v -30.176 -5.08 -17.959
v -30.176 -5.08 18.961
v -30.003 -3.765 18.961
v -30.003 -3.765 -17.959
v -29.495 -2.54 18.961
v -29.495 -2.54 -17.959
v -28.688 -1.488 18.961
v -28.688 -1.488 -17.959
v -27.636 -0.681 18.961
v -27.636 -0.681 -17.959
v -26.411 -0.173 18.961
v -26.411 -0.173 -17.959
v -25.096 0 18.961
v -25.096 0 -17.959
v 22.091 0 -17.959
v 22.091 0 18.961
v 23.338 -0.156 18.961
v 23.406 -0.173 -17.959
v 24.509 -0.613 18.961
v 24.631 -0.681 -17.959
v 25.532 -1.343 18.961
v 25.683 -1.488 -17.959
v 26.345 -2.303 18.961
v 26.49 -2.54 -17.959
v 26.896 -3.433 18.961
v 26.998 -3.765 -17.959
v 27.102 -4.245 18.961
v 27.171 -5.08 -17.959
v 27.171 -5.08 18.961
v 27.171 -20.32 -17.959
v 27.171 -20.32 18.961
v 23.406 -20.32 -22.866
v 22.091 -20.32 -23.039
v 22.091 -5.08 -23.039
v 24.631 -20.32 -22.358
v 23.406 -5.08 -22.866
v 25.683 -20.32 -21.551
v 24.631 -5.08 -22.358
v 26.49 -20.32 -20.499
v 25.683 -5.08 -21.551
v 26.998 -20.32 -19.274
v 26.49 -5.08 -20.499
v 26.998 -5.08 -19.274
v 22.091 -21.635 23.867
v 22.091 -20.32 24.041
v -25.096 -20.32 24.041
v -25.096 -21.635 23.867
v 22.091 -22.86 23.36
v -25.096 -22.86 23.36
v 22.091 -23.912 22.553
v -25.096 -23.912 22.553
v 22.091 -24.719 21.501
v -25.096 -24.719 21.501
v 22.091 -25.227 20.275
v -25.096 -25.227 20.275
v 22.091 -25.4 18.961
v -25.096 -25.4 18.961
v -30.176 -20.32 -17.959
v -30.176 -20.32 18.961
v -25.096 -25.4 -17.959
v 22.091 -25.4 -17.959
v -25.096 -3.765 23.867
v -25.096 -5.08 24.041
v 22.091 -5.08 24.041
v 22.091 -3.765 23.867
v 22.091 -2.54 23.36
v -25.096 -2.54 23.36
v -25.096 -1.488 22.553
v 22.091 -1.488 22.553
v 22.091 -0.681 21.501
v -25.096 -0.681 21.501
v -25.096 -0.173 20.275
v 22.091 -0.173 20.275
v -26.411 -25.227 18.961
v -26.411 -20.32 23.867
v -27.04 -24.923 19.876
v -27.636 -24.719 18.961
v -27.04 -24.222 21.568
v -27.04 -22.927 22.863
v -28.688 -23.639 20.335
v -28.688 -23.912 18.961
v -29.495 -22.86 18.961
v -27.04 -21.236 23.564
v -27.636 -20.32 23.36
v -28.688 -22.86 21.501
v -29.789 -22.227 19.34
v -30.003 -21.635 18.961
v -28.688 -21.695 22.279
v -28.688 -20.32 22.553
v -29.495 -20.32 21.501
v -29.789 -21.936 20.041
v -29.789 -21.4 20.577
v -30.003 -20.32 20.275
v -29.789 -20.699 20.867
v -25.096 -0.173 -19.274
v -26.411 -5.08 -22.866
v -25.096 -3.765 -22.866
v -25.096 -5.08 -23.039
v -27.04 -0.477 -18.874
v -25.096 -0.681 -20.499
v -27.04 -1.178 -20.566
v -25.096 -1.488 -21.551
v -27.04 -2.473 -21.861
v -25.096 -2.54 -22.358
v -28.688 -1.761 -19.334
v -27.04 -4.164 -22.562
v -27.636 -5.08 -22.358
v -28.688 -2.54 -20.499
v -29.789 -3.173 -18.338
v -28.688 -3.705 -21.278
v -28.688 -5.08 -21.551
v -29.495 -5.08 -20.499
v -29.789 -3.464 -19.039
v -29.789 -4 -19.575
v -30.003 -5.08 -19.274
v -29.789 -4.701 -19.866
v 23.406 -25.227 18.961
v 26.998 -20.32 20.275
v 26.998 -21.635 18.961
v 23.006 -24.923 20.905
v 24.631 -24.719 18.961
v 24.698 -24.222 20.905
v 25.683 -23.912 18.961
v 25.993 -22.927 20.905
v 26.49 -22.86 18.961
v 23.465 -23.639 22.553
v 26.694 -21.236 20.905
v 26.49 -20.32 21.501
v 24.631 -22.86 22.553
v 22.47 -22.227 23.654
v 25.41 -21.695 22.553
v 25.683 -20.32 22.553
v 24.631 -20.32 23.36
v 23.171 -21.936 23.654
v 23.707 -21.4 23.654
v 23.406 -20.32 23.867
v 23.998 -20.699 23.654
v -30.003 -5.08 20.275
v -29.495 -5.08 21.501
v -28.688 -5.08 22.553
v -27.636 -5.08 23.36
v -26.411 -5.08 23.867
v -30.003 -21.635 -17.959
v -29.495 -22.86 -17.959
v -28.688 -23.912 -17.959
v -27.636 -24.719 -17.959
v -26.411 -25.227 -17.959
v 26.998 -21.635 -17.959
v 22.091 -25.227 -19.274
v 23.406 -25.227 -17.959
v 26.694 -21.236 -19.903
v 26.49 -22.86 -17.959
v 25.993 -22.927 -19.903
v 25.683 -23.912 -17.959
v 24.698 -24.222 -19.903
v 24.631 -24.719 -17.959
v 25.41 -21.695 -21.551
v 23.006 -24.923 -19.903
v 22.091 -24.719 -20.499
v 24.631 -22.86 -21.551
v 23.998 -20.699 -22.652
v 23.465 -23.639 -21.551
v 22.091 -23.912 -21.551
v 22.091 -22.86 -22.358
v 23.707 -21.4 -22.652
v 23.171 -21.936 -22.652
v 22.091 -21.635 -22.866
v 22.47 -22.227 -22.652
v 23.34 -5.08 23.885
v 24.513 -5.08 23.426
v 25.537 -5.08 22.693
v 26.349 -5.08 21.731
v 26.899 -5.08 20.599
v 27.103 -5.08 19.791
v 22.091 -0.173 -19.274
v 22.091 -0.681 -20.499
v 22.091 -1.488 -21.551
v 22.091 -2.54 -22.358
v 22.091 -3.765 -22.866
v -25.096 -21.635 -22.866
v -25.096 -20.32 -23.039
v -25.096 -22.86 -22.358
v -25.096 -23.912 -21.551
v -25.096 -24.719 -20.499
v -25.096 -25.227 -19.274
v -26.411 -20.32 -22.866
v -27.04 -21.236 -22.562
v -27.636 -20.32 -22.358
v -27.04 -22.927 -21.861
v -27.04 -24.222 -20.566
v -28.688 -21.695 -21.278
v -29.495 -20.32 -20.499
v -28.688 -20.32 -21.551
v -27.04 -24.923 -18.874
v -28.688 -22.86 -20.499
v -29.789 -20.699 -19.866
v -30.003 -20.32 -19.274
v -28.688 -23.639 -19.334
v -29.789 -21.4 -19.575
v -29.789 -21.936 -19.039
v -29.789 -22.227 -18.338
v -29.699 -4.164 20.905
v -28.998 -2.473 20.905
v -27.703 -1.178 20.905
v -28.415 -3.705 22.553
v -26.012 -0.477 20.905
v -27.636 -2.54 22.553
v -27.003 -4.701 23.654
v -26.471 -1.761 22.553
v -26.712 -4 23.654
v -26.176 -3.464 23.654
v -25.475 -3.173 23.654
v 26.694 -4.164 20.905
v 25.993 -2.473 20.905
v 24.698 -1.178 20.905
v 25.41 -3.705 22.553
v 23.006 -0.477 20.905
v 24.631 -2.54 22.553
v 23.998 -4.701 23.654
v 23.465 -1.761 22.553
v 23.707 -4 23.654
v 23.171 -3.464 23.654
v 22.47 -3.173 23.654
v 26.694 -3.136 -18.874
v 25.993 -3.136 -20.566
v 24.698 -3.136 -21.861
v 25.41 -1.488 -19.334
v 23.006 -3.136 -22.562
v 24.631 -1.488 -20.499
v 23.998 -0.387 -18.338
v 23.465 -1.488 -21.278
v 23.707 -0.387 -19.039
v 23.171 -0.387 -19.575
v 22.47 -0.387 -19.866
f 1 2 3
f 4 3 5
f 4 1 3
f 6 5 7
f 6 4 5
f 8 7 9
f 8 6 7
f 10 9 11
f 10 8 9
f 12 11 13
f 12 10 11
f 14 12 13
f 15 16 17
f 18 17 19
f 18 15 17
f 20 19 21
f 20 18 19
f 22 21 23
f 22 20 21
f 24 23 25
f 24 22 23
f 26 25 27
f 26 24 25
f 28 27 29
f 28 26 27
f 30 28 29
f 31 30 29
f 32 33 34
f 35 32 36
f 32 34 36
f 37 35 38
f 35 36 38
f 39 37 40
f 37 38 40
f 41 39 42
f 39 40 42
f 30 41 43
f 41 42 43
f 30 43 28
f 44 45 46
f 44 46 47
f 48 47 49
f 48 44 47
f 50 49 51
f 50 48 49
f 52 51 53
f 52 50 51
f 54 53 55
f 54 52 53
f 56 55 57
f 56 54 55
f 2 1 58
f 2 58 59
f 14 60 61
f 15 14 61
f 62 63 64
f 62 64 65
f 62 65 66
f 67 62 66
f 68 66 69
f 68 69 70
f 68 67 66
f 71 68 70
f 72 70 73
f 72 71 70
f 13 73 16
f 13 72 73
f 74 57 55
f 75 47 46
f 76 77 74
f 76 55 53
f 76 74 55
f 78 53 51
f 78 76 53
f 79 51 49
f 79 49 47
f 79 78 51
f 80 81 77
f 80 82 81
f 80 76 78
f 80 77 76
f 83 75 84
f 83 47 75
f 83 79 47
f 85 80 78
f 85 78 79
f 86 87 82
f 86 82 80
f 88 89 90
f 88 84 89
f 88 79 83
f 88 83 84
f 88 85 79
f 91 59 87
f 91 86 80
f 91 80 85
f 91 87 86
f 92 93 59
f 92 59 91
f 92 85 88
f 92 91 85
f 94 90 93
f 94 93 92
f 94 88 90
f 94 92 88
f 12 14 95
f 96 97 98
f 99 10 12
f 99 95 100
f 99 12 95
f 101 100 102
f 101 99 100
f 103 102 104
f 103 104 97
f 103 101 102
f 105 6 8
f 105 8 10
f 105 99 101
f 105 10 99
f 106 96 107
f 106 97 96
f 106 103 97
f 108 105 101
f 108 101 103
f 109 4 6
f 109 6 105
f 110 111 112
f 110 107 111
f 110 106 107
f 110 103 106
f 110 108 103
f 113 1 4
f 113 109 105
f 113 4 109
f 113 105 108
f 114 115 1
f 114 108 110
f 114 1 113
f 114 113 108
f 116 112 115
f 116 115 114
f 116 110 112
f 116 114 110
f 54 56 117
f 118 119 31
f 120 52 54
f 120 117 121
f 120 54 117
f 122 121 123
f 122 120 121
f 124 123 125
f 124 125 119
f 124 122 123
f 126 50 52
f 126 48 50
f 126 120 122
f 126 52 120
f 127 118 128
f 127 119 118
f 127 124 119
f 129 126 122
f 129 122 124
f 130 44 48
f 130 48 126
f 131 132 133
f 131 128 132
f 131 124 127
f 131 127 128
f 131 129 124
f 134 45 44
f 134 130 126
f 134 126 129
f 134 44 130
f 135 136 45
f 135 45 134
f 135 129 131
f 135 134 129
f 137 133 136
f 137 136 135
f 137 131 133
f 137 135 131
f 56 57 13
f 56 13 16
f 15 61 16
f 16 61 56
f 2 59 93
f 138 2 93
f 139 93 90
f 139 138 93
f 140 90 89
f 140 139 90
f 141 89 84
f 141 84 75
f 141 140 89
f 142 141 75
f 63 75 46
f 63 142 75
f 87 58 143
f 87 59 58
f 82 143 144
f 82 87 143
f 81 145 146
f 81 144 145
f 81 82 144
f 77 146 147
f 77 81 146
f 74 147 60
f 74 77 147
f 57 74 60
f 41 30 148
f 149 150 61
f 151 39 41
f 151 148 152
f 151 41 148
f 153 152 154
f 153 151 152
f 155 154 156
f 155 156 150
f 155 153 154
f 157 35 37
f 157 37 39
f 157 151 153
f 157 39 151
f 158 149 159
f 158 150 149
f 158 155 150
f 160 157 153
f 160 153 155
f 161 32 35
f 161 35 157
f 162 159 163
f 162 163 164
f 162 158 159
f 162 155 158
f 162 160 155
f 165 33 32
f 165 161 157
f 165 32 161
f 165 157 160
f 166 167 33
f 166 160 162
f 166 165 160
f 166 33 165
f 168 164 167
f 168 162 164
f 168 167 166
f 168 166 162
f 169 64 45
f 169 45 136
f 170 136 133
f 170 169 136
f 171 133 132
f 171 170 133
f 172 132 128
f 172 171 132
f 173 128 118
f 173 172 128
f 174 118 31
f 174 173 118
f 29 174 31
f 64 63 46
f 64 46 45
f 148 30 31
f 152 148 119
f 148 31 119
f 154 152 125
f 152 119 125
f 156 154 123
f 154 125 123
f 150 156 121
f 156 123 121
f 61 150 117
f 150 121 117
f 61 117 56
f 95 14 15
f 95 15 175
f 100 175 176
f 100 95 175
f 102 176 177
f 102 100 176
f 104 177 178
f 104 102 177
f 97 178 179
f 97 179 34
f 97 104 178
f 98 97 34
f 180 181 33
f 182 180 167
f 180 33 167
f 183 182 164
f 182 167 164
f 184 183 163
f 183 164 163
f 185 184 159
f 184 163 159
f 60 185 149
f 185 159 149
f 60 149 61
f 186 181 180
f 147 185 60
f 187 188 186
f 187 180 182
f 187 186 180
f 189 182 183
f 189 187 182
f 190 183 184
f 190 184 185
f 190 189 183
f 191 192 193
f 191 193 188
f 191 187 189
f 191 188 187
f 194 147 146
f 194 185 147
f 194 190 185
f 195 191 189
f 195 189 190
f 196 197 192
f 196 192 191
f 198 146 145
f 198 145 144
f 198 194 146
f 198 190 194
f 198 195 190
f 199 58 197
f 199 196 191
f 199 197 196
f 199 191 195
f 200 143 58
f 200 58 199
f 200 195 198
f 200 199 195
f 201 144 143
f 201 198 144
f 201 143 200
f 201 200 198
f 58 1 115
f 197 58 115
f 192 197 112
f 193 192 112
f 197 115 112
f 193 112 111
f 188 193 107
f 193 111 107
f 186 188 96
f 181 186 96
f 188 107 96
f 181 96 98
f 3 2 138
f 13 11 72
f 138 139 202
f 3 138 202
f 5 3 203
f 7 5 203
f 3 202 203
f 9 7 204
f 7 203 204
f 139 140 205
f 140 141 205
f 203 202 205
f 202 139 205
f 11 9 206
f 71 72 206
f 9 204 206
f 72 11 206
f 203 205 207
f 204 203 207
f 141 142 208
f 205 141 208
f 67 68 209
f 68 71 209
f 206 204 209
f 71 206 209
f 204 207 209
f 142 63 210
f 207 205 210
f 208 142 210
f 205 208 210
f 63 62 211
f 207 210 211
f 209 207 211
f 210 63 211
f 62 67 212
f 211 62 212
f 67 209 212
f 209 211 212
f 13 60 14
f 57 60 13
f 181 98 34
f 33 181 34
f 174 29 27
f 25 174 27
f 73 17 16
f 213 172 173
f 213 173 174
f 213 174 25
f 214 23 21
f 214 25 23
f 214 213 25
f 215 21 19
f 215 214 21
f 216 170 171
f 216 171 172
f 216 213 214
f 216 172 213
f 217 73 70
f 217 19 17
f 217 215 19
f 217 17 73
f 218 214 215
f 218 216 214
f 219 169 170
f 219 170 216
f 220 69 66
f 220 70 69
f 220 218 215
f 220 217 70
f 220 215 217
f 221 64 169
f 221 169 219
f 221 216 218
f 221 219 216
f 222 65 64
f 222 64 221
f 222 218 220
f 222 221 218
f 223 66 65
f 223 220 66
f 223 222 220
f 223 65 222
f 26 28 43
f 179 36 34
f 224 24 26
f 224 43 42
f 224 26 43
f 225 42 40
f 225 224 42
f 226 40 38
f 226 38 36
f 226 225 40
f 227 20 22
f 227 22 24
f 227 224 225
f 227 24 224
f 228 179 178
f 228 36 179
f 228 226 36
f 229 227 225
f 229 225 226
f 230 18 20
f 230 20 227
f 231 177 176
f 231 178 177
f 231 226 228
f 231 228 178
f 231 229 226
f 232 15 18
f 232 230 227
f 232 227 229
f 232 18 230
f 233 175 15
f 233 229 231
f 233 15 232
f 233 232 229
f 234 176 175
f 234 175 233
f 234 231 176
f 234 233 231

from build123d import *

# Parameters (mm, degrees)
F0_W         = 57.346759364
F0_H         = 47.0794383436
F1_DEPTH     = 25.4
F2_R         = 5.08
F3_T1_DEPTH  = 33.02
F3_T3_DEPTH  = 72.4794383436
F3_S7_W      = 5.08
F3_S7_H      = 5.08
F3_T8_DEPTH  = 5.08
F3_S13_W     = 5.08
F3_S13_H     = 5.08
F3_T14_DEPTH = 5.08
F4_T1_DEPTH  = 47.186759364
F4_T3_DEPTH  = 15.24
F4_T5_DEPTH  = 54.6994383436
F4_S9_W      = 5.08
F4_S9_H      = 5.08
F4_T10_DEPTH = 5.08
F4_S15_W     = 5.08
F4_S15_H     = 5.08
F4_T16_DEPTH = 5.08
F4_S21_W     = 5.08
F4_S21_H     = 5.08
F4_T22_DEPTH = 5.08
F5_T1_DEPTH  = 47.186759364
F5_T3_DEPTH  = 15.24
F5_S7_W      = 5.08
F5_S7_H      = 5.08
F5_T8_DEPTH  = 5.08
F5_S13_W     = 5.08
F5_S13_H     = 5.08
F5_T14_DEPTH = 5.08
F5_T18_ANGLE = 89.9999999979
F6_DEPTH     = 25.4


# Not quite as in the source:
# - a fillet or chamfer that OpenCascade refuses, or shapes differently, is made with other operations: its cross-section is extruded or revolved along the edge and cut away or added


with BuildPart() as f1:
    # F0 (on Front) → F1 (new body)
    with BuildSketch(Plane.XZ):
        with Locations((-1.5025353059, 0.5008457229)):
            Rectangle(F0_W, F0_H)
    extrude(amount=F1_DEPTH)

    # F2
    f2_edges = [f1.edges().sort_by_distance(p)[0] for p in [
        (-30.175915, -25.4, 0.500846),
        (-1.502535, -25.4, -23.038873),
        (27.170844, -25.4, 0.500846),
        (-1.502535, -25.4, 24.040565),
    ]]
    fillet(f2_edges, radius=F2_R)

    # F3: fillet of radius 5.08 on 3 edges, made by hand

    # F3_s2 → F3_t1 (cut)
    with BuildSketch(Plane.XZ.offset(-12.7)):
        with BuildLine():
            ThreePointArc((22.0908443761, 24.0405648947), (25.6829468245, 22.5526673431), (27.1708443761, 18.9605648947))
            Line((27.1708443761, 18.9605648947), (27.1708443761, 24.0405648947))
            Line((27.1708443761, 24.0405648947), (22.0908443761, 24.0405648947))
        make_face()
        with BuildLine():
            ThreePointArc((22.0908443761, -23.038873449), (25.6829468245, -21.5509758974), (27.1708443761, -17.958873449))
            Line((27.1708443761, -17.958873449), (27.1708443761, -23.038873449))
            Line((27.1708443761, -23.038873449), (22.0908443761, -23.038873449))
        make_face()
    extrude(amount=F3_T1_DEPTH, mode=Mode.SUBTRACT)

    # F3_s4 → F3_t3 (cut)
    with BuildSketch(Plane.XY.offset(-35.738873449)):
        with BuildLine():
            ThreePointArc((22.0908443761, 0), (25.6829468245, -1.4878975516), (27.1708443761, -5.08))
            Line((27.1708443761, -5.08), (27.1708443761, 0))
            Line((27.1708443761, 0), (22.0908443761, 0))
        make_face()
    extrude(amount=F3_T3_DEPTH, mode=Mode.SUBTRACT)


with BuildPart() as f3_tool6:
    # F3_s7 → F3_t8 (new body)
    with BuildSketch(Plane.XY.offset(-17.958873449)):
        with Locations((24.6308443761, -22.86)):
            Rectangle(F3_S7_W, F3_S7_H)
    extrude(amount=-F3_T8_DEPTH)

    # F3_s9 → F3_t10 (revolve, cut)
    with BuildSketch(Plane(origin=(22.0908443761, -20.32, -17.958873449), x_dir=(-0.7071067812, 0.7071067812, 0), z_dir=(-0.7071067812, -0.7071067812, 0))):
        with BuildLine():
            ThreePointArc((0, -5.08), (5.08, 0), (0, 5.08))
            Line((0, 5.08), (0, -5.08))
        make_face()
    revolve(axis=Axis((22.0908443761, -20.32, -17.958873449), (0, 0, -1)), mode=Mode.SUBTRACT)


with BuildPart() as f1_1:
    add(f1.part)

    # F3_t5: cut F3_tool6
    add(f3_tool6.part, mode=Mode.SUBTRACT)


with BuildPart() as f3_tool12:
    # F3_s13 → F3_t14 (new body)
    with BuildSketch(Plane.XY.offset(18.9605648947)):
        with Locations((24.6308443761, -22.86)):
            Rectangle(F3_S13_W, F3_S13_H)
    extrude(amount=F3_T14_DEPTH)

    # F3_s15 → F3_t16 (revolve, cut)
    with BuildSketch(Plane(origin=(22.0908443761, -20.32, 18.9605648947), x_dir=(-0.7071067812, 0.7071067812, 0), z_dir=(0.7071067812, 0.7071067812, 0))):
        with BuildLine():
            ThreePointArc((0, -5.08), (5.08, 0), (0, 5.08))
            Line((0, 5.08), (0, -5.08))
        make_face()
    revolve(axis=Axis((22.0908443761, -20.32, 18.9605648947), (0, 0, 1)), mode=Mode.SUBTRACT)


with BuildPart() as f1_2:
    add(f1_1.part)

    # F3_t11: cut F3_tool12
    add(f3_tool12.part, mode=Mode.SUBTRACT)

    # F4: fillet of radius 5.08 on 3 edges, made by hand

    # F4_s2 → F4_t1 (cut)
    with BuildSketch(Plane.YZ.offset(-25.0959149879)):
        with BuildLine():
            ThreePointArc((0, -17.958873449), (-1.4878975516, -21.5509758974), (-5.08, -23.038873449))
            Line((-5.08, -23.038873449), (0, -23.038873449))
            Line((0, -23.038873449), (0, -17.958873449))
        make_face()
    extrude(amount=F4_T1_DEPTH, mode=Mode.SUBTRACT)

    # F4_s4 → F4_t3 (cut)
    with BuildSketch(Plane.XZ.offset(5.08)):
        with BuildLine():
            ThreePointArc((-30.1759149879, -17.958873449), (-28.6880174363, -21.5509758974), (-25.0959149879, -23.038873449))
            Line((-25.0959149879, -23.038873449), (-30.1759149879, -23.038873449))
            Line((-30.1759149879, -23.038873449), (-30.1759149879, -17.958873449))
        make_face()
    extrude(amount=F4_T3_DEPTH, mode=Mode.SUBTRACT)

    # F4_s6 → F4_t5 (cut)
    with BuildSketch(Plane.XY.offset(-17.958873449)):
        with BuildLine():
            ThreePointArc((-30.1759149879, -5.08), (-28.6880174363, -1.4878975516), (-25.0959149879, 0))
            Line((-25.0959149879, 0), (-30.1759149879, 0))
            Line((-30.1759149879, 0), (-30.1759149879, -5.08))
        make_face()
    extrude(amount=F4_T5_DEPTH, mode=Mode.SUBTRACT)


with BuildPart() as f4_tool8:
    # F4_s9 → F4_t10 (new body)
    with BuildSketch(Plane.YZ.offset(-25.0959149879)):
        with Locations((-22.86, -20.498873449)):
            Rectangle(F4_S9_W, F4_S9_H)
    extrude(amount=-F4_T10_DEPTH)

    # F4_s11 → F4_t12 (revolve, cut)
    with BuildSketch(Plane(origin=(-25.0959149879, -20.32, -17.958873449), x_dir=(0, 0.7071067812, 0.7071067812), z_dir=(0, -0.7071067812, 0.7071067812))):
        with BuildLine():
            ThreePointArc((0, -5.08), (5.08, 0), (0, 5.08))
            Line((0, 5.08), (0, -5.08))
        make_face()
    revolve(axis=Axis((-25.0959149879, -20.32, -17.958873449), (-1, 0, 0)), mode=Mode.SUBTRACT)


with BuildPart() as f1_3:
    add(f1_2.part)

    # F4_t7: cut F4_tool8
    add(f4_tool8.part, mode=Mode.SUBTRACT)


with BuildPart() as f4_tool14:
    # F4_s15 → F4_t16 (new body)
    with BuildSketch(Plane.XZ.offset(5.08)):
        with Locations((24.6308443761, -20.498873449)):
            Rectangle(F4_S15_W, F4_S15_H)
    extrude(amount=-F4_T16_DEPTH)

    # F4_s17 → F4_t18 (revolve, cut)
    with BuildSketch(Plane(origin=(22.0908443761, -5.08, -17.958873449), x_dir=(-0.7071067812, 0, 0.7071067812), z_dir=(-0.7071067812, 0, -0.7071067812))):
        with BuildLine():
            ThreePointArc((0, -5.08), (5.08, 0), (0, 5.08))
            Line((0, 5.08), (0, -5.08))
        make_face()
    revolve(axis=Axis((22.0908443761, -5.08, -17.958873449), (0, 1, 0)), mode=Mode.SUBTRACT)


with BuildPart() as f1_4:
    add(f1_3.part)

    # F4_t13: cut F4_tool14
    add(f4_tool14.part, mode=Mode.SUBTRACT)


with BuildPart() as f4_tool20:
    # F4_s21 → F4_t22 (new body)
    with BuildSketch(Plane.YZ.offset(-25.0959149879)):
        with Locations((-2.54, -20.498873449)):
            Rectangle(F4_S21_W, F4_S21_H)
    extrude(amount=-F4_T22_DEPTH)

    # F4_s23 → F4_t24 (revolve, cut)
    with BuildSketch(Plane(origin=(-25.0959149879, -5.08, -17.958873449), x_dir=(0, -0.7071067812, 0.7071067812), z_dir=(0, -0.7071067812, -0.7071067812))):
        with BuildLine():
            ThreePointArc((0, -5.08), (5.08, 0), (0, 5.08))
            Line((0, 5.08), (0, -5.08))
        make_face()
    revolve(axis=Axis((-25.0959149879, -5.08, -17.958873449), (-1, 0, 0)), mode=Mode.SUBTRACT)


with BuildPart() as f1_5:
    add(f1_4.part)

    # F4_t19: cut F4_tool20
    add(f4_tool20.part, mode=Mode.SUBTRACT)

    # F5: fillet of radius 5.08 on 2 edges, made by hand

    # F5_s2 → F5_t1 (cut)
    with BuildSketch(Plane.YZ.offset(-25.0959149879)):
        with BuildLine():
            ThreePointArc((-5.08, 24.0405648947), (-1.4878975516, 22.5526673431), (0, 18.9605648947))
            Line((0, 18.9605648947), (0, 24.0405648947))
            Line((0, 24.0405648947), (-5.08, 24.0405648947))
        make_face()
    extrude(amount=F5_T1_DEPTH, mode=Mode.SUBTRACT)

    # F5_s4 → F5_t3 (cut)
    with BuildSketch(Plane.XZ.offset(5.08)):
        with BuildLine():
            ThreePointArc((-30.1759149879, 18.9605648947), (-28.6880174363, 22.5526673431), (-25.0959149879, 24.0405648947))
            Line((-25.0959149879, 24.0405648947), (-30.1759149879, 24.0405648947))
            Line((-30.1759149879, 24.0405648947), (-30.1759149879, 18.9605648947))
        make_face()
    extrude(amount=F5_T3_DEPTH, mode=Mode.SUBTRACT)


with BuildPart() as f5_tool6:
    # F5_s7 → F5_t8 (new body)
    with BuildSketch(Plane.YZ.offset(-25.0959149879)):
        with Locations((-22.86, 21.5005648947)):
            Rectangle(F5_S7_W, F5_S7_H)
    extrude(amount=-F5_T8_DEPTH)

    # F5_s9 → F5_t10 (revolve, cut)
    with BuildSketch(Plane(origin=(-25.0959149879, -20.32, 18.9605648947), x_dir=(0, 0.7071067812, -0.7071067812), z_dir=(0, 0.7071067812, 0.7071067812))):
        with BuildLine():
            ThreePointArc((0, -5.08), (5.08, 0), (0, 5.08))
            Line((0, 5.08), (0, -5.08))
        make_face()
    revolve(axis=Axis((-25.0959149879, -20.32, 18.9605648947), (-1, 0, 0)), mode=Mode.SUBTRACT)


with BuildPart() as f1_6:
    add(f1_5.part)

    # F5_t5: cut F5_tool6
    add(f5_tool6.part, mode=Mode.SUBTRACT)


with BuildPart() as f5_tool12:
    # F5_s13 → F5_t14 (new body)
    with BuildSketch(Plane.XY.offset(18.9605648947)):
        with Locations((24.6308443761, -2.54)):
            Rectangle(F5_S13_W, F5_S13_H)
    extrude(amount=F5_T14_DEPTH)

    # F5_s15 → F5_t16 (revolve, cut)
    with BuildSketch(Plane(origin=(22.0908443761, -5.08, 18.9605648947), x_dir=(-0.7071067812, -0.7071067812, 0), z_dir=(-0.7071067812, 0.7071067812, 0))):
        with BuildLine():
            ThreePointArc((0, -5.08), (5.08, 0), (0, 5.08))
            Line((0, 5.08), (0, -5.08))
        make_face()
    revolve(axis=Axis((22.0908443761, -5.08, 18.9605648947), (0, 0, 1)), mode=Mode.SUBTRACT)


with BuildPart() as f1_7:
    add(f1_6.part)

    # F5_t11: cut F5_tool12
    add(f5_tool12.part, mode=Mode.SUBTRACT)

    # F5_s17 → F5_t18 (revolve, cut)
    with BuildSketch(Plane.XZ.offset(5.0800000001)):
        with BuildLine():
            ThreePointArc((-30.1759149879, 18.9605648947), (-28.6880174363, 22.5526673431), (-25.0959149879, 24.0405648947))
            Line((-25.0959149879, 24.0405648947), (-30.1759149879, 24.0405648947))
            Line((-30.1759149879, 24.0405648947), (-30.1759149879, 18.9605648947))
        make_face()
    revolve(axis=Axis((-25.0959149878, -5.0800000001, 24.0405648947), (0, 0, -1)), revolution_arc=F5_T18_ANGLE, mode=Mode.SUBTRACT)

    # F6 (cut): a face of the model
    f6_faces = [f1_7.faces().sort_by_distance(p)[0] for p in [
        (-1.5025353059, -25.4, 0.5008457229),
    ]]
    extrude(f6_faces, amount=-F6_DEPTH, mode=Mode.SUBTRACT)


solid = f1_7.part
